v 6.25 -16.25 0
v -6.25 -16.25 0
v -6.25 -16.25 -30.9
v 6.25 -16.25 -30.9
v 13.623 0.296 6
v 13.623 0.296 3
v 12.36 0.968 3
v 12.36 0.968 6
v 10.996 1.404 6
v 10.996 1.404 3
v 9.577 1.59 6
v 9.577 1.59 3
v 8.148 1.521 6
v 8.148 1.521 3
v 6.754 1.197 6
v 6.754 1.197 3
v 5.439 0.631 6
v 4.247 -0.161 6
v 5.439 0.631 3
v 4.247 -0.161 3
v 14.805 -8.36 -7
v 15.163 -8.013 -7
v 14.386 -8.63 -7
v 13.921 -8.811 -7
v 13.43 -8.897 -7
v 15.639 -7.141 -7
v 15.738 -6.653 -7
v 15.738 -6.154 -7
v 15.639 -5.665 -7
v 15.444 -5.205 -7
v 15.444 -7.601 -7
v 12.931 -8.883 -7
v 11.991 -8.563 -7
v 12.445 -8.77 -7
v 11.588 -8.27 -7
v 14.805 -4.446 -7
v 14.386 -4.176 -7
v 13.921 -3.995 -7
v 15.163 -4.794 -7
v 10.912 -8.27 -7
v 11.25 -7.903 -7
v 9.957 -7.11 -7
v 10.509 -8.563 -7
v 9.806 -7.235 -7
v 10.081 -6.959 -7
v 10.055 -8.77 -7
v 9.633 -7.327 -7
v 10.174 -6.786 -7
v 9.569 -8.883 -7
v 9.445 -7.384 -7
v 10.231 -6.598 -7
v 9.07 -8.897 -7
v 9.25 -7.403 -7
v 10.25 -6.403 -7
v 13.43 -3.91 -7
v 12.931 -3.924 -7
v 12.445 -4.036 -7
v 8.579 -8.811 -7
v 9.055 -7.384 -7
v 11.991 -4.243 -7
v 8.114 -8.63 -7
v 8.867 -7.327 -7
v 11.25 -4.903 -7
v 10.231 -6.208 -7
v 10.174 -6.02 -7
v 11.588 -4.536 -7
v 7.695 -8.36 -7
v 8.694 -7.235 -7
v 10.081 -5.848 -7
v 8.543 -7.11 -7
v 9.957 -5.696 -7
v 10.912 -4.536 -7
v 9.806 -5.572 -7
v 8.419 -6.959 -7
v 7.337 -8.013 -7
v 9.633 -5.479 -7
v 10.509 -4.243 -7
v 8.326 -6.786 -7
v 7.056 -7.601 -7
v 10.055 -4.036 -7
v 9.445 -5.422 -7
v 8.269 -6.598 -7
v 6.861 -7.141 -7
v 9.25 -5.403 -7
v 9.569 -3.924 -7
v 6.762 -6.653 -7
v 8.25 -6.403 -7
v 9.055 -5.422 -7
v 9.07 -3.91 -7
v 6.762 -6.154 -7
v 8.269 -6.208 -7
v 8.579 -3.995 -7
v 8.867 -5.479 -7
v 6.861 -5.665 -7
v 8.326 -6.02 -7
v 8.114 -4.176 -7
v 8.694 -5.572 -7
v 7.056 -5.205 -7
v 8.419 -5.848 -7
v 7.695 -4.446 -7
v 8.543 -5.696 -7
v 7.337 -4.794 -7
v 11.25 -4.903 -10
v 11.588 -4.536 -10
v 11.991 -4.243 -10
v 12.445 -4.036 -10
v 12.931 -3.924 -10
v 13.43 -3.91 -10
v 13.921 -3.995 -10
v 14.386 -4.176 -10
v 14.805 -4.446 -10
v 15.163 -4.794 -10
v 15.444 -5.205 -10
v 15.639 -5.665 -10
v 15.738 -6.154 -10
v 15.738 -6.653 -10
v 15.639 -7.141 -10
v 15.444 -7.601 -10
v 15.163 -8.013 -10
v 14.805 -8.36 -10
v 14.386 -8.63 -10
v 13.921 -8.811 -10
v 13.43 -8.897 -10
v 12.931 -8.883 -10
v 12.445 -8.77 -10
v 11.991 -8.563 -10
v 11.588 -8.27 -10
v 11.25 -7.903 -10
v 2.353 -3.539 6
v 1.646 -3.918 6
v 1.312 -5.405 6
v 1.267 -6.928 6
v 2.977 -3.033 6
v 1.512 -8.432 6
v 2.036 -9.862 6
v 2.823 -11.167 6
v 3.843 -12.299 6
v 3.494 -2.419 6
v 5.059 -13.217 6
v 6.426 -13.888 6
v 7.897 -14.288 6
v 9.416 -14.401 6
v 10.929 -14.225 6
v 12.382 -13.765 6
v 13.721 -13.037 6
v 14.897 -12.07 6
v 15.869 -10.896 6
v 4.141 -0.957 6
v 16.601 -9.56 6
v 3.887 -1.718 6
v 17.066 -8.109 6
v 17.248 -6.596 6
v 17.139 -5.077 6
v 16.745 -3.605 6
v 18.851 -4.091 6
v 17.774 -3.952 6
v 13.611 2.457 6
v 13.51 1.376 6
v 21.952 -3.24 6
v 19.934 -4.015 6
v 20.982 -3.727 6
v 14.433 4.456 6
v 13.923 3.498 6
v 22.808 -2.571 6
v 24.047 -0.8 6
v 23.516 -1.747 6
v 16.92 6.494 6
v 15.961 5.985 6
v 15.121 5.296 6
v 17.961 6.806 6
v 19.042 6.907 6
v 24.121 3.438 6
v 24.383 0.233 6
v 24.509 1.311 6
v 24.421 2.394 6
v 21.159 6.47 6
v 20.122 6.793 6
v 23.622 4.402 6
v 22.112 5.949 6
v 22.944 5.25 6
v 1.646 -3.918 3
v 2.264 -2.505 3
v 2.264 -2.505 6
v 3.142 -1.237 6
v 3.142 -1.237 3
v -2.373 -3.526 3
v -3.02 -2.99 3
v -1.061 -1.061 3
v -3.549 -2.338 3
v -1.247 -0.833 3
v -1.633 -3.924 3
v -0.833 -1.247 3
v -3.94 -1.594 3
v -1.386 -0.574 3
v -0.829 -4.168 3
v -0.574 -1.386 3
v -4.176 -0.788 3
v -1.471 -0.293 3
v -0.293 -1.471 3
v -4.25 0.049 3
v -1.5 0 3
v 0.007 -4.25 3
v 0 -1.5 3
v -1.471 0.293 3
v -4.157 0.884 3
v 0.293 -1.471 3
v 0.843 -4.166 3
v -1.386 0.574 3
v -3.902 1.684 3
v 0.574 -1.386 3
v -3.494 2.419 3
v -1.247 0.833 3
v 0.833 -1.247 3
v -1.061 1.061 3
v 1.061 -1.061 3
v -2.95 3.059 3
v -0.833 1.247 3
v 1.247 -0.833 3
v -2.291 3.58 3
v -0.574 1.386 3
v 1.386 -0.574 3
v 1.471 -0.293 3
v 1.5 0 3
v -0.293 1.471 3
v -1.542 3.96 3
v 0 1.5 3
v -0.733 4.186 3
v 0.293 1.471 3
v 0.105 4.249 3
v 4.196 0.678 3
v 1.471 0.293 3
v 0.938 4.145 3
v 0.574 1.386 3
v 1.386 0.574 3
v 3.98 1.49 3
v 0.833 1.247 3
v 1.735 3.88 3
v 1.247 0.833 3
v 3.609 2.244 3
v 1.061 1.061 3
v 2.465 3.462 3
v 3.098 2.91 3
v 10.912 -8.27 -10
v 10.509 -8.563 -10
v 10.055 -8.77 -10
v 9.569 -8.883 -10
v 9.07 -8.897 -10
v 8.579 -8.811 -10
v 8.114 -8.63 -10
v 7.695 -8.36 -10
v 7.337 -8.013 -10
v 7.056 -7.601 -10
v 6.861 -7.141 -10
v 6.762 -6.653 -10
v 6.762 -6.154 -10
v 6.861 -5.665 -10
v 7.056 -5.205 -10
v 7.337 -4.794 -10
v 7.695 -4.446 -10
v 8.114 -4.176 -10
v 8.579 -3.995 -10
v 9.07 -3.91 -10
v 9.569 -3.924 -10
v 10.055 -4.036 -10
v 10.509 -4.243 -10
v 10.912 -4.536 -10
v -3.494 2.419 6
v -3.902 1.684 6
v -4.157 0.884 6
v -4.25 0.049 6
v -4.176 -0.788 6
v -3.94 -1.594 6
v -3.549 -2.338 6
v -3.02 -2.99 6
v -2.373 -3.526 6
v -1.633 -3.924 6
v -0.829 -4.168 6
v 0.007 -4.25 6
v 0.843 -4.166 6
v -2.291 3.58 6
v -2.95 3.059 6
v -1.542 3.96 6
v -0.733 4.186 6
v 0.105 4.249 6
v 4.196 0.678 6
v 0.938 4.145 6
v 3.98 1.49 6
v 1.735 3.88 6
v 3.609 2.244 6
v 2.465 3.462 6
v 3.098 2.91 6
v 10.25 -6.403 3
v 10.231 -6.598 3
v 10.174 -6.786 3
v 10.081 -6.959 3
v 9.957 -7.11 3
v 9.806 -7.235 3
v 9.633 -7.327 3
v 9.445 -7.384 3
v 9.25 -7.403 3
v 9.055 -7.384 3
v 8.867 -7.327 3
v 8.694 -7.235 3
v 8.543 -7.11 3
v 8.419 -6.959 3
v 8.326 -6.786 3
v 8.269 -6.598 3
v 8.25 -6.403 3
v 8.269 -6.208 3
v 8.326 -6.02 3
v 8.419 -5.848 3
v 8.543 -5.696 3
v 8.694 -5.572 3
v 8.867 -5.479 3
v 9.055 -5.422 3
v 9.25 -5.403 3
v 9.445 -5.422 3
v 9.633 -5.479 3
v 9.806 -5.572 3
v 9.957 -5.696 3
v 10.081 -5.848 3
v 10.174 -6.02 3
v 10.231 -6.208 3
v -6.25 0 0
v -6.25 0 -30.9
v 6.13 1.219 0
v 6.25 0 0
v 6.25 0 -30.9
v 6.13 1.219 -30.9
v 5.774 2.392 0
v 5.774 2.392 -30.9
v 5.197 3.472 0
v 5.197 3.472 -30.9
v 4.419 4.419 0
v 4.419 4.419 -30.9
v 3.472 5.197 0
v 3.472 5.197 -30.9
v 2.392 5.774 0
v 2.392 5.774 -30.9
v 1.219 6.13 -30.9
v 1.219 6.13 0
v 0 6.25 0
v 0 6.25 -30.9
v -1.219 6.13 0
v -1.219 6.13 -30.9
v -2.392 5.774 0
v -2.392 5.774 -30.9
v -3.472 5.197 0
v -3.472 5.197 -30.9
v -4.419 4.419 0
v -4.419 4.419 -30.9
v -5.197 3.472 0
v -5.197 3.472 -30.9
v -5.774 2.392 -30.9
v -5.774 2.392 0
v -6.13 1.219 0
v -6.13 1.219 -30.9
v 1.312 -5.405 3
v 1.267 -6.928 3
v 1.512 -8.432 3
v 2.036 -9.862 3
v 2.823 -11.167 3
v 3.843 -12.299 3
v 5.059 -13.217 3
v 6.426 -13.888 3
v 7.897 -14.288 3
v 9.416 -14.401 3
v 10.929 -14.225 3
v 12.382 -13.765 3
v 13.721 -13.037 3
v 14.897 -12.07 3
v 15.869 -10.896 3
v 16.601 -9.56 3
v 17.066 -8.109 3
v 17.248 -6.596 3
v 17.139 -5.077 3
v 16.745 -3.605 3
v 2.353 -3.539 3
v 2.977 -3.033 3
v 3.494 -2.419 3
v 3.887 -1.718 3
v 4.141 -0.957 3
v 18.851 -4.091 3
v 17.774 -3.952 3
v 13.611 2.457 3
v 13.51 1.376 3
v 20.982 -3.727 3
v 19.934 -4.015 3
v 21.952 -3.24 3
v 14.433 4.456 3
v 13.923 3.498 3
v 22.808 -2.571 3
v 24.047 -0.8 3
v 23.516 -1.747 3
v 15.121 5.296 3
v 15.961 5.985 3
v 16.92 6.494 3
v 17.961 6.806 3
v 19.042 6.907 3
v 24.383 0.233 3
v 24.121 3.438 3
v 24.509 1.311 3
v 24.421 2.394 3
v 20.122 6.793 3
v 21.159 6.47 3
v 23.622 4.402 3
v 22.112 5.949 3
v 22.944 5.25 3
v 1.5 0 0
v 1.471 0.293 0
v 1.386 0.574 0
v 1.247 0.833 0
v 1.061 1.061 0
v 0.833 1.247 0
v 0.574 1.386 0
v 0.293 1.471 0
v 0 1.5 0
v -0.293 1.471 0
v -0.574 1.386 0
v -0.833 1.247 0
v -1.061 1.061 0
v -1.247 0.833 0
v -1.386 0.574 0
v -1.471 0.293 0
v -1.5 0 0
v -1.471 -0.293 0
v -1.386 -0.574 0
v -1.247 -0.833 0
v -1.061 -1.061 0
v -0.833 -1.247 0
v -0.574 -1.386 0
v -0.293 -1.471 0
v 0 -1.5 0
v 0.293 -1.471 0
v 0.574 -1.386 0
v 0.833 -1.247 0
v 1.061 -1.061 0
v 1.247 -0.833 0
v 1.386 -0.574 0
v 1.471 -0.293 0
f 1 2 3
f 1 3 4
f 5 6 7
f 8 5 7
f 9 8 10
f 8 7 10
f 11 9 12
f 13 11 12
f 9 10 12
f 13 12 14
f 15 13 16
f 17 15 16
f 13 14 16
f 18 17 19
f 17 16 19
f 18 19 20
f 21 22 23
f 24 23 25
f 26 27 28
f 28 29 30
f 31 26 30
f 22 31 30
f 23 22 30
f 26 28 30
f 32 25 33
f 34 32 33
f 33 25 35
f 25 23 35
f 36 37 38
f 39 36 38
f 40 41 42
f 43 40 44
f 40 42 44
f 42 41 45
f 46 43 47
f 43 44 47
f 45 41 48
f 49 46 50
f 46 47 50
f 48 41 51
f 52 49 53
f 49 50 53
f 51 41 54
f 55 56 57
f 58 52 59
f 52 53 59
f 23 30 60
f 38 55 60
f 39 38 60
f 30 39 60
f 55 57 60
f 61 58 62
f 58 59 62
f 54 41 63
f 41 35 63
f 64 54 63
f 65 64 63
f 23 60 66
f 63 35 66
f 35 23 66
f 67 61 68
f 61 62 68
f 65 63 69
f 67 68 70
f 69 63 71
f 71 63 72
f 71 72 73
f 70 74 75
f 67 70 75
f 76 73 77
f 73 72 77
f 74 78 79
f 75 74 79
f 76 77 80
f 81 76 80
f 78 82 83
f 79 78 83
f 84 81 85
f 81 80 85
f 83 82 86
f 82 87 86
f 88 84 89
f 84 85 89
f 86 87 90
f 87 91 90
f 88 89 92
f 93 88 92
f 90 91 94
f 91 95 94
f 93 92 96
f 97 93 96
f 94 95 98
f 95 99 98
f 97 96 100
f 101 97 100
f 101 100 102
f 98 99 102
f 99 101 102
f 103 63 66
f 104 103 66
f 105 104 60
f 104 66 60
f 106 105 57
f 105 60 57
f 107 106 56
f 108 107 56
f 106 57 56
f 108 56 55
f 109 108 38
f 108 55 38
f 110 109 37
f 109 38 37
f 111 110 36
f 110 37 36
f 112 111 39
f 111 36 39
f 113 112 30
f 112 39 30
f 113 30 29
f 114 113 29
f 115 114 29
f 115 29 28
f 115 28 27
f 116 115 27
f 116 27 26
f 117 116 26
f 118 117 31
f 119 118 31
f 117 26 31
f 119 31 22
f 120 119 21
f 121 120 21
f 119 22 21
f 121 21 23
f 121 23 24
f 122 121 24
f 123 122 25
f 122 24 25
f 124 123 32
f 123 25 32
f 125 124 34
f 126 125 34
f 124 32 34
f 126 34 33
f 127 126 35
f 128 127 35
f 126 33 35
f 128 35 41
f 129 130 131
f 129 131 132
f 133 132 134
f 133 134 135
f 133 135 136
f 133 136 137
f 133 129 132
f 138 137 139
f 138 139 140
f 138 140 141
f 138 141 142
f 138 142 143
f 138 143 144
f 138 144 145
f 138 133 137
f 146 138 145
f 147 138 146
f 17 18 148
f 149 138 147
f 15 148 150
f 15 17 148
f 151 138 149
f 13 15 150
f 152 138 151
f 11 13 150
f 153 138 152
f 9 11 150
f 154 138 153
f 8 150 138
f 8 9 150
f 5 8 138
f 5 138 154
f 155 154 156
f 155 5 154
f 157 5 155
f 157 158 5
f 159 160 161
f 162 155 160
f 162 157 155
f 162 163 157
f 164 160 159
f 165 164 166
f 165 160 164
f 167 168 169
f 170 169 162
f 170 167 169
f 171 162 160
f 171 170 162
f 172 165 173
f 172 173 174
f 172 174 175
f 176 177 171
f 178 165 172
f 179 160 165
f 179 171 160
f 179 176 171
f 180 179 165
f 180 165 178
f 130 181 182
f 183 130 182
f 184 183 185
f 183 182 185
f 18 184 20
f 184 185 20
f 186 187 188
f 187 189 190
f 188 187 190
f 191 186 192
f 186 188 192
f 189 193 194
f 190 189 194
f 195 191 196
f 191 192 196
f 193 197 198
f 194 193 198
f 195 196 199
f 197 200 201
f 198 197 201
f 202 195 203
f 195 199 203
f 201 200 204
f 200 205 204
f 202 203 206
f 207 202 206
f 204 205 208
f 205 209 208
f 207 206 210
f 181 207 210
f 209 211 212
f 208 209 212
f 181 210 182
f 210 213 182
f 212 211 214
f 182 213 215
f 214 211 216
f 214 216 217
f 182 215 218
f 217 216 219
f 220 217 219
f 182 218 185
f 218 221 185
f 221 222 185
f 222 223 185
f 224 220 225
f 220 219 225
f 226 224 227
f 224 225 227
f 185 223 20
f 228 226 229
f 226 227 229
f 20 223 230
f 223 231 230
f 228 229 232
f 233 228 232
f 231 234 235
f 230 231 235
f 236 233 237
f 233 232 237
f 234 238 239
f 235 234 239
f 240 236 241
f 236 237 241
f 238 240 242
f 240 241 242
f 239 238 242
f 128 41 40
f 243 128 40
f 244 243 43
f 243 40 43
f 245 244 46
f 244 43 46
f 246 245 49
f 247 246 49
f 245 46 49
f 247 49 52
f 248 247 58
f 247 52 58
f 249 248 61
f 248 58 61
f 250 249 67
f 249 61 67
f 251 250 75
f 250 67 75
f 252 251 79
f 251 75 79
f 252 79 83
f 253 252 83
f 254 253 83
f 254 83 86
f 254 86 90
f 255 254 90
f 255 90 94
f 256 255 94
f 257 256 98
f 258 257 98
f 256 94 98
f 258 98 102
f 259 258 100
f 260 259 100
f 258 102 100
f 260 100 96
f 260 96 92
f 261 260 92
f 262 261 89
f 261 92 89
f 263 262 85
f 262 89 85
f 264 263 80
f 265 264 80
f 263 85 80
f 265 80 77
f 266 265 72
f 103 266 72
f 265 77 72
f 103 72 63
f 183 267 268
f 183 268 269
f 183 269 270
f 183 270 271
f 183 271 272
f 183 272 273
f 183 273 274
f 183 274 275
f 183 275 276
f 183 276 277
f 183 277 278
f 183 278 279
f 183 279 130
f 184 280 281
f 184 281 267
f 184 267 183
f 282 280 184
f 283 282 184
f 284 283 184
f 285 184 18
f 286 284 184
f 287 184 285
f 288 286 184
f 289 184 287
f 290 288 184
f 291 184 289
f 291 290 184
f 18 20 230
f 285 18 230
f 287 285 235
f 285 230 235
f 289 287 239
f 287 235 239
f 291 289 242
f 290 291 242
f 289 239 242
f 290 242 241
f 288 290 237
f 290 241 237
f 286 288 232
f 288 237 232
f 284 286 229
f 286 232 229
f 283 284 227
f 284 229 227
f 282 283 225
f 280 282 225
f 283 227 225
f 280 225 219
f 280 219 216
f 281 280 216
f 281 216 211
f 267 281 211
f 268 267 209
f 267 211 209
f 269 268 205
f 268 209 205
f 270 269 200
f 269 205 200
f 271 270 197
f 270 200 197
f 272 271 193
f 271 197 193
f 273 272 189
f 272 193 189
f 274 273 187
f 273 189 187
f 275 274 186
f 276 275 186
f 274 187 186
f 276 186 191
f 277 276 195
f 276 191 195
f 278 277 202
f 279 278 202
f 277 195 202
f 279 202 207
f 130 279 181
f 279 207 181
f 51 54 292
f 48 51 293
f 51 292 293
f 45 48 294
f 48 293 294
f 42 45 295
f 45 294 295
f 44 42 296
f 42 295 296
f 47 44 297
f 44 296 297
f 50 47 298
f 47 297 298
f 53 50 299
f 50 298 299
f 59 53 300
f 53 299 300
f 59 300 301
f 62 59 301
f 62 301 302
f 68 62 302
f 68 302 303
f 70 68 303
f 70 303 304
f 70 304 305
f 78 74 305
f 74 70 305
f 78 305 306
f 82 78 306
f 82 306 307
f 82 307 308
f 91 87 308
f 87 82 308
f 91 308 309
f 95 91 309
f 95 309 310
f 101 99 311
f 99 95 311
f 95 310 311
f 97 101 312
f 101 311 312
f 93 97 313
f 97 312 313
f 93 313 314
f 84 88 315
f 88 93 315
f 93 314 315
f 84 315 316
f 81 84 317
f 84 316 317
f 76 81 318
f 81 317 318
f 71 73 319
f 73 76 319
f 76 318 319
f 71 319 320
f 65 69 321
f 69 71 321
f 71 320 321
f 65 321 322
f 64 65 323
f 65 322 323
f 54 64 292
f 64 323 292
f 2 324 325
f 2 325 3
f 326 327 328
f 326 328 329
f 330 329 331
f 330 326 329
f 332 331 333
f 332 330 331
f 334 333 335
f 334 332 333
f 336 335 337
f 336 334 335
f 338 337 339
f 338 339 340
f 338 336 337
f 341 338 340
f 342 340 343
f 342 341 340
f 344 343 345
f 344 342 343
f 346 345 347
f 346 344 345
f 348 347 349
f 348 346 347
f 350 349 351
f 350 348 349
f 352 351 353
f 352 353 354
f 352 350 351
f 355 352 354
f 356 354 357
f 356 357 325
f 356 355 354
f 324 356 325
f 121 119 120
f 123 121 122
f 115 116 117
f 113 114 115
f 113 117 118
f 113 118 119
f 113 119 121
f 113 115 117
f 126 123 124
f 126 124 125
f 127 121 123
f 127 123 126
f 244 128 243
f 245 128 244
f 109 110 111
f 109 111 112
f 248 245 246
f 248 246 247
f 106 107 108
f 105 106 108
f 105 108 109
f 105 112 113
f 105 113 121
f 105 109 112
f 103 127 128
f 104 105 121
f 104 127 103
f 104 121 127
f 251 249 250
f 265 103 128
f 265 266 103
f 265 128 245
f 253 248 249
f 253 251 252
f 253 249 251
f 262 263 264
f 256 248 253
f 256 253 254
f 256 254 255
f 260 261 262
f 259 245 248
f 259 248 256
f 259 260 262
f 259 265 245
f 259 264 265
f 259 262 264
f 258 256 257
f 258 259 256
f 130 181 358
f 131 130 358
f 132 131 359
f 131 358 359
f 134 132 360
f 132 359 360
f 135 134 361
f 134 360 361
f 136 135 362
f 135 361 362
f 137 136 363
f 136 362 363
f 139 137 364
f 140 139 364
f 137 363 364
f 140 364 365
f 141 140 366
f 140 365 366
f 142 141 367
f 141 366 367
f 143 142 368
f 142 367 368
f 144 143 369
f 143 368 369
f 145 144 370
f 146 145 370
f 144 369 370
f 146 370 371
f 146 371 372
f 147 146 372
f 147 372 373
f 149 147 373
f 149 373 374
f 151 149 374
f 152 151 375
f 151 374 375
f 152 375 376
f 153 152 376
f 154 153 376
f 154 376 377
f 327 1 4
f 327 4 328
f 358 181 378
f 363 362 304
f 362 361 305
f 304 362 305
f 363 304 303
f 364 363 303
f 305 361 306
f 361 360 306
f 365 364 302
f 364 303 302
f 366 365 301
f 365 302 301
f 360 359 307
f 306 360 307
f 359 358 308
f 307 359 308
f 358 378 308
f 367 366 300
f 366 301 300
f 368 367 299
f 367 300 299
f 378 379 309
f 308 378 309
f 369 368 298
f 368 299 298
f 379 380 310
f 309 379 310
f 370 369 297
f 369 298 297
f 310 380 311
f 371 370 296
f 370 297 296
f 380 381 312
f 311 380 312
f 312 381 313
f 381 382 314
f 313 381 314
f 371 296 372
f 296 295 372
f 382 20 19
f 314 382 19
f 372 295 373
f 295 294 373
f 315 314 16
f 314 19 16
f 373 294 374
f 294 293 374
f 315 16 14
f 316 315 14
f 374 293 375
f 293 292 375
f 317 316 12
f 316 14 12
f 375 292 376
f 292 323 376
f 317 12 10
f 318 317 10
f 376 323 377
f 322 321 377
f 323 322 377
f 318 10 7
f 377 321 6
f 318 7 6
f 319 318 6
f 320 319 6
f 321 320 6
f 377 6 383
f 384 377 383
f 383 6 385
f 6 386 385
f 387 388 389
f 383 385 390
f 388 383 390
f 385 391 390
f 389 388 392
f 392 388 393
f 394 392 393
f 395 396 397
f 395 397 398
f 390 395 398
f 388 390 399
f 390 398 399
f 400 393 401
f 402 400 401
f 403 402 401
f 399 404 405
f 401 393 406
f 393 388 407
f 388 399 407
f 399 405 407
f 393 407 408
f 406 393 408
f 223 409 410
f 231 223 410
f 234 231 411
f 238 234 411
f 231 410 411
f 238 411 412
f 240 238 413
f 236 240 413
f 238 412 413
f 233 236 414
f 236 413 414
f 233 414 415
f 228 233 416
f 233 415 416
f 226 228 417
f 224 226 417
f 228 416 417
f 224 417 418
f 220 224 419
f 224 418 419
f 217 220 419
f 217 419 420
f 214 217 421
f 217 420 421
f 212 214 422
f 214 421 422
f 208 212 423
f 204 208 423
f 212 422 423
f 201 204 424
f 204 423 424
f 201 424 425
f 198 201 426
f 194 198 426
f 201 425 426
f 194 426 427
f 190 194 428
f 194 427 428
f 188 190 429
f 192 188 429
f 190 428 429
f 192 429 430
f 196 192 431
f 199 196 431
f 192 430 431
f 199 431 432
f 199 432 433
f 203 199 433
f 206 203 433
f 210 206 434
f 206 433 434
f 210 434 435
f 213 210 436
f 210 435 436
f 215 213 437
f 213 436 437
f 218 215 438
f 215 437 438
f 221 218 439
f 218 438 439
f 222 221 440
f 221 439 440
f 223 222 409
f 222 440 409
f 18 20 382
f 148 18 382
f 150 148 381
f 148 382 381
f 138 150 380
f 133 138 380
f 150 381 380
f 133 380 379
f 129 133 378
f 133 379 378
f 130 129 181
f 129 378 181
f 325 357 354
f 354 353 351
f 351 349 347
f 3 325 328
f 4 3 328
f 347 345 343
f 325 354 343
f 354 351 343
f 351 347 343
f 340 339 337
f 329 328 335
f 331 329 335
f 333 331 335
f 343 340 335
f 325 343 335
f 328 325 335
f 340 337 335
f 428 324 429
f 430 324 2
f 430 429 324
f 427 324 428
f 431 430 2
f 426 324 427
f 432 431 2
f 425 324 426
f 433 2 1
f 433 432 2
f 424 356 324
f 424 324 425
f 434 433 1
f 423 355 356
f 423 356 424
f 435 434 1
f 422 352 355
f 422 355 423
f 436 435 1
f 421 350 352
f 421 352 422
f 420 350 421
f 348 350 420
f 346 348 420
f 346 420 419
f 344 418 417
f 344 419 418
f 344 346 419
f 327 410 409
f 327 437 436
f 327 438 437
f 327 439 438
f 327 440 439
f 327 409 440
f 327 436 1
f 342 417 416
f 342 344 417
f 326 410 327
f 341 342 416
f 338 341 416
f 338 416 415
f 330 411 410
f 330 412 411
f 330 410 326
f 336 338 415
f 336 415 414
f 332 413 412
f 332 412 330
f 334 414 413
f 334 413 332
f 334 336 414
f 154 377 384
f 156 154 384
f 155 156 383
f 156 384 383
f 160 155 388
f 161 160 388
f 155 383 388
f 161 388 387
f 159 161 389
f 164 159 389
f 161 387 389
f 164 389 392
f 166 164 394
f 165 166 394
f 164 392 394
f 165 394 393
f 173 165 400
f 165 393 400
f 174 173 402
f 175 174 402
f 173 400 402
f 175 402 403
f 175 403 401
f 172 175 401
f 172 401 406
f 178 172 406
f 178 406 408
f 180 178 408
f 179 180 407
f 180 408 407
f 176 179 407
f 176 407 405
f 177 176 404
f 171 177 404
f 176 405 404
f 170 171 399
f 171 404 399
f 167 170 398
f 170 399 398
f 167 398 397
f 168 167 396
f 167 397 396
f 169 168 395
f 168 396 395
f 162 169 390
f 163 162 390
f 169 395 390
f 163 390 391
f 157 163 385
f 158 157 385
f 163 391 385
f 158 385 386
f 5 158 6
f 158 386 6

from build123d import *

# Parameters (mm, degrees)
BOSS_EXTRUDE7_DEPTH  = 30.9
SKETCH7_R            = 1.5
BOSS_EXTRUDE8_DEPTH  = 3
BOSS_EXTRUDE9_DEPTH  = 3
SKETCH9_R            = 1
BOSS_EXTRUDE10_DEPTH = 11.773049601
BOSS_EXTRUDE11_DEPTH = 3


with BuildPart() as part:
    # Sketch6 → Boss-Extrude7 (new body)
    with BuildSketch(Plane.XY):
        with BuildLine():
            Line((-6.25, 0), (-6.25, -16.25))
            Line((-6.25, -16.25), (6.25, -16.25))
            Line((6.25, -16.25), (6.25, 0))
            ThreePointArc((6.25, 0), (0, 6.25), (-6.25, 0))
        make_face()
    extrude(amount=-BOSS_EXTRUDE7_DEPTH)

    # Sketch7 → Boss-Extrude8 (add)
    with BuildSketch(Plane.XY):
        Circle(SKETCH7_R)
    extrude(amount=BOSS_EXTRUDE8_DEPTH)

    # Sketch8 → Boss-Extrude9 (add)
    with BuildSketch(Plane.XY.offset(3)):
        with BuildLine():
            ThreePointArc((4.246966167, -0.160556459), (-3.494444444, 2.418958045), (1.645626426, -3.918470833))
            ThreePointArc((1.645626426, -3.918470833), (2.672222222, -1.849791446), (4.246966167, -0.160556459))
        make_face()
        with BuildLine():
            ThreePointArc((4.246966167, -0.160556459), (3.494444444, -2.418958045), (1.645626426, -3.918470833))
            ThreePointArc((1.645626426, -3.918470833), (9.416028142, -14.401401218), (16.744714653, -3.605044132))
            ThreePointArc((16.744714653, -3.605044132), (23.304127047, 4.843275763), (13.623214853, 0.295755658))
            ThreePointArc((13.623214853, 0.295755658), (8.861125761, 1.587418724), (4.246966167, -0.160556459))
        make_face()
    extrude(amount=BOSS_EXTRUDE9_DEPTH)


with BuildPart() as boss_extrude9_piece_1:
    # of the separate pieces the step leaves, piece 1, a body of its own (boss_extrude9_pieces)
    add(part.part.solids().sort_by_distance((1.5, 0, 3))[0])


with BuildPart() as boss_extrude9_piece_2:
    # of the separate pieces the step leaves, piece 2, a body of its own (boss_extrude9_pieces)
    add(part.part.solids().sort_by_distance((13.623214853, 0.295755658, 3))[0])

    # Sketch9 → Boss-Extrude10 (add)
    with BuildSketch(Plane(origin=(0, 0, 3), x_dir=(-1, 0, 0), z_dir=(0, 0, -1))):
        with Locations(Location((-9.25, -6.403124237, 0), (0, 0, 180))):
            Circle(SKETCH9_R)
    extrude(amount=BOSS_EXTRUDE10_DEPTH)

    # Sketch10 → Boss-Extrude11 (add)
    with BuildSketch(Plane(origin=(0, 0, -7), x_dir=(-1, 0, 0), z_dir=(0, 0, -1))):
        with BuildLine():
            ThreePointArc((-11.25, -7.903124237), (-6.75, -6.403124237), (-11.25, -4.903124237))
            ThreePointArc((-11.25, -4.903124237), (-15.75, -6.403124237), (-11.25, -7.903124237))
        make_face()
    extrude(amount=BOSS_EXTRUDE11_DEPTH)


solid = Compound([boss_extrude9_piece_1.part, boss_extrude9_piece_2.part])
